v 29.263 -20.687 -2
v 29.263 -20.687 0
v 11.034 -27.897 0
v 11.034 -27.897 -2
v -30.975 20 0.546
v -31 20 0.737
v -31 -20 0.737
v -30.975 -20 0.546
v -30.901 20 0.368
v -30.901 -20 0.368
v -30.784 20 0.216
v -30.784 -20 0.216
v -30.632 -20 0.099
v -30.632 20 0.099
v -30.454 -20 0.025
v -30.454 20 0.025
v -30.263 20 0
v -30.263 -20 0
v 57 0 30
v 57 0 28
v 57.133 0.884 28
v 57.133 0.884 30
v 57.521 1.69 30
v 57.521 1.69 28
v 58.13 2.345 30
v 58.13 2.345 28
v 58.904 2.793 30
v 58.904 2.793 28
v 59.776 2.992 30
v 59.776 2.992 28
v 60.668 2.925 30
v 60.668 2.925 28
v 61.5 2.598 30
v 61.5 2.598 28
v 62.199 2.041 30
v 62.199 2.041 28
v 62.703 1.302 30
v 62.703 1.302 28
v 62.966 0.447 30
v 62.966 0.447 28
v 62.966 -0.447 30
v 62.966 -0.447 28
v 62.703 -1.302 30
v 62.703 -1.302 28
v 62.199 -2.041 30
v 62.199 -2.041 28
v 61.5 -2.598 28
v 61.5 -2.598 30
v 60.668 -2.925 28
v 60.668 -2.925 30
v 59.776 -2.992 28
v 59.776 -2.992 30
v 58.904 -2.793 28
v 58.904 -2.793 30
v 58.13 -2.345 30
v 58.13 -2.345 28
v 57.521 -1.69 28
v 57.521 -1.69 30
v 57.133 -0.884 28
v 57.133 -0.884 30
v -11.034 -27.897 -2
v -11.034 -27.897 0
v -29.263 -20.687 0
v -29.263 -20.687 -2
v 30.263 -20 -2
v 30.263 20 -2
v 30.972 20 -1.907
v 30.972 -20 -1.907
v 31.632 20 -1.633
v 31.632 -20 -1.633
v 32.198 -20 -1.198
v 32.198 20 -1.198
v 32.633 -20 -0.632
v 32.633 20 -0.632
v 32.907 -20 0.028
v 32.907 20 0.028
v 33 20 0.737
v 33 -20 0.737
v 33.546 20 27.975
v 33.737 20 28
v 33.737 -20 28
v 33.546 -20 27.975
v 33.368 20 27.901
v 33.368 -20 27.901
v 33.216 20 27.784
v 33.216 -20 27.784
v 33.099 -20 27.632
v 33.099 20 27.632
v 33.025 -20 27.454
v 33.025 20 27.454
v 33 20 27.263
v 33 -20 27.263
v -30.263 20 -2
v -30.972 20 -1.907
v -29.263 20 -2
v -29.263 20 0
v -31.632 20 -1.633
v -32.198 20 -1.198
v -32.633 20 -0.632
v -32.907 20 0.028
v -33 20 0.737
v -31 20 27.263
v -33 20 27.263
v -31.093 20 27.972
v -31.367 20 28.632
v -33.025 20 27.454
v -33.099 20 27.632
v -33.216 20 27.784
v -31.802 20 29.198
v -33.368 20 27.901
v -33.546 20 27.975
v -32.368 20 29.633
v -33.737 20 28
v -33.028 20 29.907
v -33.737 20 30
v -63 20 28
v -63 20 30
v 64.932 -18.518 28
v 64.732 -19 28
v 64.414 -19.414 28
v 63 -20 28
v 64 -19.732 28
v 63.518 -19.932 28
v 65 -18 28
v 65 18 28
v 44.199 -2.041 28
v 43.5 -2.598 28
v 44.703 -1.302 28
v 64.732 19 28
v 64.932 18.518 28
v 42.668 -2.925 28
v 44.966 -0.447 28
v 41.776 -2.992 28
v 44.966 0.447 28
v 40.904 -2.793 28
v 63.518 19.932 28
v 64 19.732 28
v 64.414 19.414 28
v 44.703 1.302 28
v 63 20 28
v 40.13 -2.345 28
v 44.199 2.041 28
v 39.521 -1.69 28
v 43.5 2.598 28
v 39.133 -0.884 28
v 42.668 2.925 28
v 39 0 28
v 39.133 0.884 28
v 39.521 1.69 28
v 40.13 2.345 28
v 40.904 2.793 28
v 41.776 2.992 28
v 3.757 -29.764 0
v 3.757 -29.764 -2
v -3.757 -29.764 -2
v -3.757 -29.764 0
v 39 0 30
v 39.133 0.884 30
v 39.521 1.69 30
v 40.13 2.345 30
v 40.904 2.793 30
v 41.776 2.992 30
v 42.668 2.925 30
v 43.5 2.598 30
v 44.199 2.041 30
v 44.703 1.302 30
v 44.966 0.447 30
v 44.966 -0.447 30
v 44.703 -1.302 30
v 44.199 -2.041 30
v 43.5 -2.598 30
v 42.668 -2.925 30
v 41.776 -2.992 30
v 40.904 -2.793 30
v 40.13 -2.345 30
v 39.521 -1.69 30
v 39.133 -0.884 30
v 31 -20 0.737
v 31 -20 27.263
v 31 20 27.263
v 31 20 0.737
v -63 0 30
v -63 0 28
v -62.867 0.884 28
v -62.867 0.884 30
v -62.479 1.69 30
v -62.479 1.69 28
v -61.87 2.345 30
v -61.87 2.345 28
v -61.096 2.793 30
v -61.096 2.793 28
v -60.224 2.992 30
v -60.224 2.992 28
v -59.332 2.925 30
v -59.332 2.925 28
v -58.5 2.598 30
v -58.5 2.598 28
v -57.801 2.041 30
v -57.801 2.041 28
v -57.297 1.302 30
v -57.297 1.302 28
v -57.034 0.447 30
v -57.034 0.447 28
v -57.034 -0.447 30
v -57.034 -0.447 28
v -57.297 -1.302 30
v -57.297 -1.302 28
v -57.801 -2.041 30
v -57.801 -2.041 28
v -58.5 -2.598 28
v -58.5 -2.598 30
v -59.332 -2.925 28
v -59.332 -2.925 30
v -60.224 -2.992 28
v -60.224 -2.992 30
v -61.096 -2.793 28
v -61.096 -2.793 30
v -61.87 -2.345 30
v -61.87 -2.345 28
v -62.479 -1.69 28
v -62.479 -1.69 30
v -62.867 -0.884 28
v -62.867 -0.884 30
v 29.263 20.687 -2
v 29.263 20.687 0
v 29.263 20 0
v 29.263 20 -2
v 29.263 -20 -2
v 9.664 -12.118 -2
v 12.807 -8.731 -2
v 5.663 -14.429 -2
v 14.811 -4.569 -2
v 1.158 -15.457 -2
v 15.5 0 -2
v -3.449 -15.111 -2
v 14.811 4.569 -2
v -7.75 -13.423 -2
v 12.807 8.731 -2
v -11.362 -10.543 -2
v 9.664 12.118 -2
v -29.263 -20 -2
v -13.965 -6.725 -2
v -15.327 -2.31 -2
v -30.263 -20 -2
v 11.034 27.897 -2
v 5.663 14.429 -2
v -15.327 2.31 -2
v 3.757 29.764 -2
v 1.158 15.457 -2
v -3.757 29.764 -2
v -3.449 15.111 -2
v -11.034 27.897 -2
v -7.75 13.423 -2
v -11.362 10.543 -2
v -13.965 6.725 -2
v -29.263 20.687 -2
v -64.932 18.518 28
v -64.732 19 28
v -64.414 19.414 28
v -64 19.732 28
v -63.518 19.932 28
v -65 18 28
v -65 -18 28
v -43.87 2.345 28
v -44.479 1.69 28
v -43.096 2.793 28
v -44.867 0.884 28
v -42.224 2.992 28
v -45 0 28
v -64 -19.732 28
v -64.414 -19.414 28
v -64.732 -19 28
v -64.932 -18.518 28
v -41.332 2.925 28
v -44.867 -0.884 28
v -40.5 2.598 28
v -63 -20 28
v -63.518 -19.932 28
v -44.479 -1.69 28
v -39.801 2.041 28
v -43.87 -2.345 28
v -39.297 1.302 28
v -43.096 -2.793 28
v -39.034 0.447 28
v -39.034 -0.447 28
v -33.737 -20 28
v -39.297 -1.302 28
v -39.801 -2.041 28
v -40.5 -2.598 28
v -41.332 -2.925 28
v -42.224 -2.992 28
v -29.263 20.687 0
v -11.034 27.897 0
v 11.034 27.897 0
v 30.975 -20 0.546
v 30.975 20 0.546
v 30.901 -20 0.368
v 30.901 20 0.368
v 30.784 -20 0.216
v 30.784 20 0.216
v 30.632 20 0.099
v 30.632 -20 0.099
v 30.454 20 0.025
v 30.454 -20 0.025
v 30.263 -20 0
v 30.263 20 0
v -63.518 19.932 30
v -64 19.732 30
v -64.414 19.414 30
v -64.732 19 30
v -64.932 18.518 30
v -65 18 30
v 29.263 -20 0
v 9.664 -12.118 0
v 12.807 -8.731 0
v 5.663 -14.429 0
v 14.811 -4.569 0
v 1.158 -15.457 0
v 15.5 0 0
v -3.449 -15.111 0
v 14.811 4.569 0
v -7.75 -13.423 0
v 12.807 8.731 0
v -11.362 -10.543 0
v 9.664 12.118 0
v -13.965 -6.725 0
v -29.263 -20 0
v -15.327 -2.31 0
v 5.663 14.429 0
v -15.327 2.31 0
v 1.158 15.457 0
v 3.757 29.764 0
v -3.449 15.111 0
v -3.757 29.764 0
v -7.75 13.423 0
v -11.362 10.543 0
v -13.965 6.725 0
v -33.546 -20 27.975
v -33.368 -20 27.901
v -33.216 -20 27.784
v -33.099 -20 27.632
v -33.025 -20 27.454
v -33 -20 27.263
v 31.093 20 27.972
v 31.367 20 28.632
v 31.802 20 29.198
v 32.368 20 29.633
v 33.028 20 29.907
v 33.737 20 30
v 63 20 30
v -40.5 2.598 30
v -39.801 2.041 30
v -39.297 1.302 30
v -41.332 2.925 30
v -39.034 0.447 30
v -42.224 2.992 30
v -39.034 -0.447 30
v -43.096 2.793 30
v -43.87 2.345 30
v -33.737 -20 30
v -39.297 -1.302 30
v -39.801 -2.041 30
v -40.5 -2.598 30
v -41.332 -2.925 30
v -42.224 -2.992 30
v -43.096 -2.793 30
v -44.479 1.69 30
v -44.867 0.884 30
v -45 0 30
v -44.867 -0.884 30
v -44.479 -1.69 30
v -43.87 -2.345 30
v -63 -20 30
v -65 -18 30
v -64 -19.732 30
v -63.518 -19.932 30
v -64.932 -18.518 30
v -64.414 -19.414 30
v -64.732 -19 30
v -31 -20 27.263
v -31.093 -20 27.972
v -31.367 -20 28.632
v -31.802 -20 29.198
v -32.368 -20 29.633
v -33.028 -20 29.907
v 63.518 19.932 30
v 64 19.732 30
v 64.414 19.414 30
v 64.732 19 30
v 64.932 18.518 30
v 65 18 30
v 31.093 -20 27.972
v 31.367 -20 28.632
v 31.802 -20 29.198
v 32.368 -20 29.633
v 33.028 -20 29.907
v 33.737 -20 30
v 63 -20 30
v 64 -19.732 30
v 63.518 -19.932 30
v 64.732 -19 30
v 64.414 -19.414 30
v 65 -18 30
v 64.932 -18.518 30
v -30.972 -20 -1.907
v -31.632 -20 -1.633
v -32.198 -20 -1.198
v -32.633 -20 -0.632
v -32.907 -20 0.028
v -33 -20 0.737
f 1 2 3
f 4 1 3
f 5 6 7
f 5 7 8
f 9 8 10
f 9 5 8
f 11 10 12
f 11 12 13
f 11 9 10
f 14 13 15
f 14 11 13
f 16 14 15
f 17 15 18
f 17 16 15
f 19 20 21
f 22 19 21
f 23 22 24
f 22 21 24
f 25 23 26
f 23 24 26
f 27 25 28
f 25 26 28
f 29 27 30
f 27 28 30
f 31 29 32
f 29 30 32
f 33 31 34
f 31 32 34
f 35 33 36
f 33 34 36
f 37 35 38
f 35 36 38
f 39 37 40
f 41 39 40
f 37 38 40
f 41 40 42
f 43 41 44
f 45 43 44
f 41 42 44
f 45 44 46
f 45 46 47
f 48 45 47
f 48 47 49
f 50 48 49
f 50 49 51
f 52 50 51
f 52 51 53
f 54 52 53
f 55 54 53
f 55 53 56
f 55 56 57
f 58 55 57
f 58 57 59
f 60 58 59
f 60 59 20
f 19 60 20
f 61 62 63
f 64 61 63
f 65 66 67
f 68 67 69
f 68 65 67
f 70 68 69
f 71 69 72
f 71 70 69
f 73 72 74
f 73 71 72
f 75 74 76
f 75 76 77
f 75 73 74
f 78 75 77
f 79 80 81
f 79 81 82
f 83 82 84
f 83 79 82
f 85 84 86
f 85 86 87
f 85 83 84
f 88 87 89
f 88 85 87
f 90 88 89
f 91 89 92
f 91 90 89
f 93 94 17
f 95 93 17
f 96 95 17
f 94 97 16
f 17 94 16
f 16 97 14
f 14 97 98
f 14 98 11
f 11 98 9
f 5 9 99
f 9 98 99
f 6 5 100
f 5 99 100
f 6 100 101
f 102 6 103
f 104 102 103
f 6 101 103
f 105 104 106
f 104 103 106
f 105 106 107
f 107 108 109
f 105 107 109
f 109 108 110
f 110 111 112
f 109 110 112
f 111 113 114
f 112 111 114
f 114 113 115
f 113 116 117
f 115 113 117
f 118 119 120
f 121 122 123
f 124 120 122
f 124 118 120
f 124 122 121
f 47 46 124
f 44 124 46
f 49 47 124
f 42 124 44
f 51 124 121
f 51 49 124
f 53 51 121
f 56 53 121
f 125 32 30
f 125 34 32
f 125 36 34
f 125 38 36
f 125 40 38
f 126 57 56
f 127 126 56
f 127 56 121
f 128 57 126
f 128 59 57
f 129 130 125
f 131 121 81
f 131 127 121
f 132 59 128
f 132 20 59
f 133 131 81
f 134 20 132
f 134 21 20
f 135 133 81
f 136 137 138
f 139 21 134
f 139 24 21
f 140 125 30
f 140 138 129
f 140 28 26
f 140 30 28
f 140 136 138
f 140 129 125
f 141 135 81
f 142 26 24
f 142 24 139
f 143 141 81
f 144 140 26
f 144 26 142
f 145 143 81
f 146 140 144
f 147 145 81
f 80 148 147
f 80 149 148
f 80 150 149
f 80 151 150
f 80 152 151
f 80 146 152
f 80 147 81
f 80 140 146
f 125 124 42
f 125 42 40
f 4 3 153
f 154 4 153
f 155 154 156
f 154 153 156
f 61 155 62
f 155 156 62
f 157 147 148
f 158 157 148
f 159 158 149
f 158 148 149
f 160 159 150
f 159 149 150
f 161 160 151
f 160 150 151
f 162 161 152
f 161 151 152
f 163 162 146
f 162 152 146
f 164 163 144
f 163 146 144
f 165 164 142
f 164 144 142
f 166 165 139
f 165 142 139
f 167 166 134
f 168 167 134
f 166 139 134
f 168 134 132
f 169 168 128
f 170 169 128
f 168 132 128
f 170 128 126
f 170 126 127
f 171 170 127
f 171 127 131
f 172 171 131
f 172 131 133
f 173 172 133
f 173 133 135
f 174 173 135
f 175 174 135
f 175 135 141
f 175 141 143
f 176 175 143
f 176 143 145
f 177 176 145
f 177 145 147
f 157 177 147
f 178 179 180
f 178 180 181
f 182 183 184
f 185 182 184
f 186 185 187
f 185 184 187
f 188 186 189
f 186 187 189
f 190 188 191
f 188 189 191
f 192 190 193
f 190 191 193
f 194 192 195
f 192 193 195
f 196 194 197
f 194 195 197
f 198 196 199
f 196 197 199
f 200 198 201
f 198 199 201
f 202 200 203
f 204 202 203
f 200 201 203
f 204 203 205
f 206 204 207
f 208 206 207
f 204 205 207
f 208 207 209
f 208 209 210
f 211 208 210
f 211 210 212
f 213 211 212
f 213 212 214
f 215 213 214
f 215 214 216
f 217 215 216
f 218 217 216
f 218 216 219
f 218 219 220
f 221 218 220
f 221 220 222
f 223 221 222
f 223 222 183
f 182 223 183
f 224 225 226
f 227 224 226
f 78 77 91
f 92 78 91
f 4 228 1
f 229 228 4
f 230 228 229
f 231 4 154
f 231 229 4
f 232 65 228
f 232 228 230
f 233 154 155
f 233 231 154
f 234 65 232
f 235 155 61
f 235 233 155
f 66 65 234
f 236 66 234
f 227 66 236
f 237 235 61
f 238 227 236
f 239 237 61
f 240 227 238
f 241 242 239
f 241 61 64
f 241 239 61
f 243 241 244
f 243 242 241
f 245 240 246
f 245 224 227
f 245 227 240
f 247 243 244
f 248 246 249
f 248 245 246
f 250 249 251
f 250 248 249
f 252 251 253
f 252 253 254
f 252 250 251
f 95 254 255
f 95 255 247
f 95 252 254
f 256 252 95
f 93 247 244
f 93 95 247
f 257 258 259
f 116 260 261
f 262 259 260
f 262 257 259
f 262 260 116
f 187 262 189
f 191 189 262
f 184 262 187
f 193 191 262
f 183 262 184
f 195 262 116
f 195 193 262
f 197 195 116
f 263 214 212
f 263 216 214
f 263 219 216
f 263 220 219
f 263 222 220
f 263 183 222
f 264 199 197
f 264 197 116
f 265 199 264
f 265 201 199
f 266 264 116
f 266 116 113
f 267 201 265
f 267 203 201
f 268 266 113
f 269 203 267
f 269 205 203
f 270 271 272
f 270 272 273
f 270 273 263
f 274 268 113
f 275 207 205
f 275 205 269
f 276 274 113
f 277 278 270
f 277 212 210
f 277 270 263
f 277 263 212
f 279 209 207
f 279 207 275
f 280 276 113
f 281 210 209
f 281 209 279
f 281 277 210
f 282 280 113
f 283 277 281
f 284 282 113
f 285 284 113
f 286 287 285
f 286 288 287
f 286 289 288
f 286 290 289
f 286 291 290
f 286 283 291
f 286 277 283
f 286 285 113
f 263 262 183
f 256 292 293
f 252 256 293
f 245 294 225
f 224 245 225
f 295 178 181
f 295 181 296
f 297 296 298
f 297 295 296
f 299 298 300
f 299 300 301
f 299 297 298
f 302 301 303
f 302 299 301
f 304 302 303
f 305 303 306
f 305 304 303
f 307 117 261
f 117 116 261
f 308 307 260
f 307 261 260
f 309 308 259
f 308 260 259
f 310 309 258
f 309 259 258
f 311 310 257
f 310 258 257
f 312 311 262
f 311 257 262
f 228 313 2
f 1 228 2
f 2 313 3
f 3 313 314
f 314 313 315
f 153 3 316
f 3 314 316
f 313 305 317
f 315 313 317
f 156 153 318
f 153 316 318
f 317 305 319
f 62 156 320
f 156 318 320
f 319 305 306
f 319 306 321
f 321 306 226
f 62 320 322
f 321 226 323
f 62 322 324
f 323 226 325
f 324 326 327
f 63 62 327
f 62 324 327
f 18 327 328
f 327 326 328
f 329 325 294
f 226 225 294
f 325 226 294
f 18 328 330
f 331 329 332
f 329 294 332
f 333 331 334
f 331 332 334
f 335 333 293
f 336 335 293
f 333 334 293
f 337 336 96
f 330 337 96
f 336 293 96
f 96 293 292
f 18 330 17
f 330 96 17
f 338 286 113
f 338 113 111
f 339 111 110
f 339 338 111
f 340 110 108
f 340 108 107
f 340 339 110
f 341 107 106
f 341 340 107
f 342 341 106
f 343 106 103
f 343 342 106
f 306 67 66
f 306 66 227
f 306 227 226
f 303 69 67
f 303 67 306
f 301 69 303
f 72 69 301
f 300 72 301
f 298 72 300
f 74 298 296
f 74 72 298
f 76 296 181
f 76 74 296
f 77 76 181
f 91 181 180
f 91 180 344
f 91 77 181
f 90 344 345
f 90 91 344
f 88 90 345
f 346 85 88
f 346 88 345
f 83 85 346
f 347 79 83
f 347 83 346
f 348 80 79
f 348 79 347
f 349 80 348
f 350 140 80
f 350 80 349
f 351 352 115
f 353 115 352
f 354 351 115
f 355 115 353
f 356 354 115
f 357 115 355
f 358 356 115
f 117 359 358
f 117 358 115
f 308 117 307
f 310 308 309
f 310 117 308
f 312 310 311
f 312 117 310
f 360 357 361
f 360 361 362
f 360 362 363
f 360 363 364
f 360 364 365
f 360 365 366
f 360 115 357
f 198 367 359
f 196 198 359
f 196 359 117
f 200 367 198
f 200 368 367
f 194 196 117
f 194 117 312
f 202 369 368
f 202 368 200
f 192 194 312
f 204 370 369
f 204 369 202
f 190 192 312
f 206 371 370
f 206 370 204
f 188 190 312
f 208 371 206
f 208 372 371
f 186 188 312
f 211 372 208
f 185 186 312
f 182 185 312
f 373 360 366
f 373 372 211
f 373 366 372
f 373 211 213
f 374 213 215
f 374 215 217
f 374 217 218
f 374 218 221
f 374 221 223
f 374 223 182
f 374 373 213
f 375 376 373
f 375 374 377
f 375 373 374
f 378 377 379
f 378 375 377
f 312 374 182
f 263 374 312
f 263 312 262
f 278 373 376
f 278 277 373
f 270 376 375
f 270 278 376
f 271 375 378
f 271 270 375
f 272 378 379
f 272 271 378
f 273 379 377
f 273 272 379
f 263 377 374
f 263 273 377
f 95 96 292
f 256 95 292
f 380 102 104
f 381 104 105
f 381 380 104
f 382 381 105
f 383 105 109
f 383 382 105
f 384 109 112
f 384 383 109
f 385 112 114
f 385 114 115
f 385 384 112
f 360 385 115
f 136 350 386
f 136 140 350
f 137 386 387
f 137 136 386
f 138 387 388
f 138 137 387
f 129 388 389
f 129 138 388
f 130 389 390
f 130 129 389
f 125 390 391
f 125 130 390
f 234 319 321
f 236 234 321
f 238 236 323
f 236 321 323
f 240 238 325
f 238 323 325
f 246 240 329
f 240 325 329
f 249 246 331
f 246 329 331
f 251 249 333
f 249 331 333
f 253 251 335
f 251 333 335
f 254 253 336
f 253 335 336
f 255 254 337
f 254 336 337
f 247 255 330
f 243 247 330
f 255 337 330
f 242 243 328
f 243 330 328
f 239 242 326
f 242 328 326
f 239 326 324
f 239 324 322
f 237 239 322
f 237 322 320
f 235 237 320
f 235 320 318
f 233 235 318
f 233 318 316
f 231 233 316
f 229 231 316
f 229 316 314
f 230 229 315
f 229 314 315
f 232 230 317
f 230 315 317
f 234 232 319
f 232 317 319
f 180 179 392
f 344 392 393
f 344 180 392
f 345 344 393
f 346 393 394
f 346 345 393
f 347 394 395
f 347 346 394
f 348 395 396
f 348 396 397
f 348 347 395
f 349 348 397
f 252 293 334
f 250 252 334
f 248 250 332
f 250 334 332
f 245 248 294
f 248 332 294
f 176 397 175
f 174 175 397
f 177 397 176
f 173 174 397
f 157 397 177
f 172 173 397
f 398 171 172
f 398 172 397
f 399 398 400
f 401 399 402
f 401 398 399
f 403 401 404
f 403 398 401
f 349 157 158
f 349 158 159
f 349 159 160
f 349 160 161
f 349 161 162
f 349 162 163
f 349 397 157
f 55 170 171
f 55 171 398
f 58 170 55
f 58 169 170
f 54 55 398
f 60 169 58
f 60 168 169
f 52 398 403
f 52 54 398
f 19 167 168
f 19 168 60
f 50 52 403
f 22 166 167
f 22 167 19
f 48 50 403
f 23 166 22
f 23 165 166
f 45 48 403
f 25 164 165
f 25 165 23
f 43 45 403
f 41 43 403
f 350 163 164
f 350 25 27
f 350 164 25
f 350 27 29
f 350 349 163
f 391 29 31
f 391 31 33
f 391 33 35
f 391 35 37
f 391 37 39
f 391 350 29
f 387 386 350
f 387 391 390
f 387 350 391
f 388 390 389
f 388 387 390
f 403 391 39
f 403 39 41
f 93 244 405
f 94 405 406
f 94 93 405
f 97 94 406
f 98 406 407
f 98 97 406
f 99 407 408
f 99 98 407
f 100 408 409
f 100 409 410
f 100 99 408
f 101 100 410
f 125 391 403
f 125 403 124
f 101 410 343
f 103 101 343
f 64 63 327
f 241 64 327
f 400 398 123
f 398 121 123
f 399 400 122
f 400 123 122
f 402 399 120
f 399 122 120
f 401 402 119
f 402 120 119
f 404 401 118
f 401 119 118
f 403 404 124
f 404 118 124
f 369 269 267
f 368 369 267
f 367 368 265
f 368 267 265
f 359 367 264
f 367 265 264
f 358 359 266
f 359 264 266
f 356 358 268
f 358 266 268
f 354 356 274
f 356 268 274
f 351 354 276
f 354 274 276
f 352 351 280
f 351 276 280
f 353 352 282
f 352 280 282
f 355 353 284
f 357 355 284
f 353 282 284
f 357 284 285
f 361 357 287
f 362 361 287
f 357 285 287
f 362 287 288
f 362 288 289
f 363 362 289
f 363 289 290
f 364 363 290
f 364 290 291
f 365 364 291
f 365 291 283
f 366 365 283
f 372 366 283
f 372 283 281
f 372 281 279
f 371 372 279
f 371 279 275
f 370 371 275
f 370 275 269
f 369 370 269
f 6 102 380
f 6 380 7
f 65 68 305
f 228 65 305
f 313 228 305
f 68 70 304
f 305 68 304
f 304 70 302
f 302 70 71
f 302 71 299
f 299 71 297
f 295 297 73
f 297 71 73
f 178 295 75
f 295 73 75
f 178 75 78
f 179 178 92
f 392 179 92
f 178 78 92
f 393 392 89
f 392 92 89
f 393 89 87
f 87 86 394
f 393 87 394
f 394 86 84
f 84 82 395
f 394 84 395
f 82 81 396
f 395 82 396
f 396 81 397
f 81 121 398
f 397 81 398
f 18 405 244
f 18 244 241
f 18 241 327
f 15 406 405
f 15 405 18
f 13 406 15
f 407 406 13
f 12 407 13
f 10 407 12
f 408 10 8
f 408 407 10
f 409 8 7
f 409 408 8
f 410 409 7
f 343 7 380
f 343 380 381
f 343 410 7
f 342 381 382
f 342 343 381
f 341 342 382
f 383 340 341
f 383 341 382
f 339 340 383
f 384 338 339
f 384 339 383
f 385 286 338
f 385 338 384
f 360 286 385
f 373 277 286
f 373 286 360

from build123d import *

# Parameters (mm, degrees)
SKETCH1_R                       = 15.5
BASE_FLANGE1_DEPTH              = 2
EDGE_FLANGE1_STRIP_W            = 9.4732
EDGE_FLANGE1_STRIP_H            = 2
EDGE_FLANGE1_STRIP_CUT_DEPTH    = 40
EDGE_FLANGE1_RELIEF_W           = 10.4732
EDGE_FLANGE1_RELIEF_H           = 1
EDGE_FLANGE1_RELIEF_CUT_DEPTH   = 2
EDGE_FLANGE1_STRIP_2_W          = 9.4732
EDGE_FLANGE1_STRIP_2_H          = 2
EDGE_FLANGE1_STRIP_CUT_2_DEPTH  = 40
EDGE_FLANGE1_RELIEF_2_W         = 10.4732
EDGE_FLANGE1_RELIEF_2_H         = 1
EDGE_FLANGE1_RELIEF_CUT_2_DEPTH = 2
EDGE_FLANGE1_DEPTH              = 40
EDGE_FLANGE1_BEND_DEPTH         = 40
EDGE_FLANGE2_STRIP_W            = 9.4732
EDGE_FLANGE2_STRIP_H            = 2
EDGE_FLANGE2_STRIP_CUT_DEPTH    = 40
EDGE_FLANGE2_STRIP_2_W          = 9.4732
EDGE_FLANGE2_STRIP_2_H          = 2
EDGE_FLANGE2_STRIP_CUT_2_DEPTH  = 40
EDGE_FLANGE2_DEPTH              = 40
EDGE_FLANGE2_BEND_DEPTH         = 40
SKETCH17_R                      = 3
CUT_EXTRUDE1_DEPTH              = 10
FILLET1_R                       = 2


# Sheet-metal steps are written as plain solids
with BuildPart() as part:
    # Sketch1 → Base-Flange1 (new body)
    with BuildSketch(Plane.XY):
        with BuildLine():
            Line((-31, 20), (-11.034132012, 27.897095382))
            ThreePointArc((-11.034132012, 27.897095382), (0, 30), (11.034132012, 27.897095382))
            Line((11.034132012, 27.897095382), (31, 20))
            Line((31, 20), (31, -20))
            Line((31, -20), (11.034132012, -27.897095382))
            ThreePointArc((11.034132012, -27.897095382), (0, -30), (-11.034132012, -27.897095382))
            Line((-11.034132012, -27.897095382), (-31, -20))
            Line((-31, -20), (-31, 20))
        make_face()
        Circle(SKETCH1_R, mode=Mode.SUBTRACT)
    extrude(amount=-BASE_FLANGE1_DEPTH)

    # Edge-Flange1 strip (across the edge) → Edge-Flange1 strip cut (cut)
    with BuildSketch(Plane(origin=(-31, 20, 0), x_dir=(1, 0, 0), z_dir=(0, -1, 0))):
        with Locations((-4, -1)):
            Rectangle(EDGE_FLANGE1_STRIP_W, EDGE_FLANGE1_STRIP_H)
    extrude(amount=EDGE_FLANGE1_STRIP_CUT_DEPTH, mode=Mode.SUBTRACT)

    # Edge-Flange1 relief (on the sheet) → Edge-Flange1 relief cut (cut)
    with BuildSketch(Plane(origin=(-30.2634, 20, 0), x_dir=(1, 0, 0), z_dir=(0, 0, 1))):
        with Locations((-4.2366, 0.5)):
            Rectangle(EDGE_FLANGE1_RELIEF_W, EDGE_FLANGE1_RELIEF_H)
        with Locations((-4.2366, -40.5)):
            Rectangle(EDGE_FLANGE1_RELIEF_W, EDGE_FLANGE1_RELIEF_H)
    extrude(amount=-EDGE_FLANGE1_RELIEF_CUT_DEPTH, mode=Mode.SUBTRACT)

    # Edge-Flange1 strip 2 (across the edge) → Edge-Flange1 strip cut 2 (cut)
    with BuildSketch(Plane(origin=(31, -20, 0), x_dir=(-1, 0, 0), z_dir=(0, 1, 0))):
        with Locations((-4, -1)):
            Rectangle(EDGE_FLANGE1_STRIP_2_W, EDGE_FLANGE1_STRIP_2_H)
    extrude(amount=EDGE_FLANGE1_STRIP_CUT_2_DEPTH, mode=Mode.SUBTRACT)

    # Edge-Flange1 relief 2 (on the sheet) → Edge-Flange1 relief cut 2 (cut)
    with BuildSketch(Plane(origin=(30.2634, -20, 0), x_dir=(-1, 0, 0), z_dir=(0, 0, 1))):
        with Locations((-4.2366, 0.5)):
            Rectangle(EDGE_FLANGE1_RELIEF_2_W, EDGE_FLANGE1_RELIEF_2_H)
        with Locations((-4.2366, -40.5)):
            Rectangle(EDGE_FLANGE1_RELIEF_2_W, EDGE_FLANGE1_RELIEF_2_H)
    extrude(amount=-EDGE_FLANGE1_RELIEF_CUT_2_DEPTH, mode=Mode.SUBTRACT)

    # Edge-Flange1 section (across the edge) → Edge-Flange1 (add)
    with BuildSketch(Plane(origin=(-31, 20, 0), x_dir=(1, 0, 0), z_dir=(0, -1, 0))):
        with BuildLine():
            Line((-2, 0.7366), (-2, 28))
            Line((-2, 28), (0, 28))
            Line((0, 28), (0, 0.7366))
            ThreePointArc((0, 0.7366), (0.215745145, 0.215745145), (0.7366, 0))
            Line((0.7366, 0), (0.7366, -2))
            ThreePointArc((0.7366, -2), (-1.198468417, -1.198468417), (-2, 0.7366))
        make_face()
    extrude(amount=EDGE_FLANGE1_DEPTH)

    # Edge-Flange1 section 2 (across the edge) → Edge-Flange1 bend (add)
    with BuildSketch(Plane(origin=(31, -20, 0), x_dir=(-1, 0, 0), z_dir=(0, 1, 0))):
        with BuildLine():
            Line((-2, 0.7366), (-2, 28))
            Line((-2, 28), (0, 28))
            Line((0, 28), (0, 0.7366))
            ThreePointArc((0, 0.7366), (0.215745145, 0.215745145), (0.7366, 0))
            Line((0.7366, 0), (0.7366, -2))
            ThreePointArc((0.7366, -2), (-1.198468417, -1.198468417), (-2, 0.7366))
        make_face()
    extrude(amount=EDGE_FLANGE1_BEND_DEPTH)

    # Edge-Flange2 strip (across the edge) → Edge-Flange2 strip cut (cut)
    with BuildSketch(Plane(origin=(-33, -20, 28), x_dir=(0, 0, -1), z_dir=(0, 1, 0))):
        with Locations((-4, -1)):
            Rectangle(EDGE_FLANGE2_STRIP_W, EDGE_FLANGE2_STRIP_H)
    extrude(amount=EDGE_FLANGE2_STRIP_CUT_DEPTH, mode=Mode.SUBTRACT)

    # Edge-Flange2 strip 2 (across the edge) → Edge-Flange2 strip cut 2 (cut)
    with BuildSketch(Plane(origin=(33, 20, 28), x_dir=(0, 0, -1), z_dir=(0, -1, 0))):
        with Locations((-4, -1)):
            Rectangle(EDGE_FLANGE2_STRIP_2_W, EDGE_FLANGE2_STRIP_2_H)
    extrude(amount=EDGE_FLANGE2_STRIP_CUT_2_DEPTH, mode=Mode.SUBTRACT)

    # Edge-Flange2 section (across the edge) → Edge-Flange2 (add)
    with BuildSketch(Plane(origin=(-33, -20, 28), x_dir=(0, 0, -1), z_dir=(0, 1, 0))):
        with BuildLine():
            Line((-2, 0.7366), (-2, 32))
            Line((-2, 32), (0, 32))
            Line((0, 32), (0, 0.7366))
            ThreePointArc((0, 0.7366), (0.215745145, 0.215745145), (0.7366, 0))
            Line((0.7366, 0), (0.7366, -2))
            ThreePointArc((0.7366, -2), (-1.198468417, -1.198468417), (-2, 0.7366))
        make_face()
    extrude(amount=EDGE_FLANGE2_DEPTH)

    # Edge-Flange2 section 2 (across the edge) → Edge-Flange2 bend (add)
    with BuildSketch(Plane(origin=(33, 20, 28), x_dir=(0, 0, -1), z_dir=(0, -1, 0))):
        with BuildLine():
            Line((-2, 0.7366), (-2, 32))
            Line((-2, 32), (0, 32))
            Line((0, 32), (0, 0.7366))
            ThreePointArc((0, 0.7366), (0.215745145, 0.215745145), (0.7366, 0))
            Line((0.7366, 0), (0.7366, -2))
            ThreePointArc((0.7366, -2), (-1.198468417, -1.198468417), (-2, 0.7366))
        make_face()
    extrude(amount=EDGE_FLANGE2_BEND_DEPTH)

    # Sketch17 → Cut-Extrude1 (cut)
    with BuildSketch(Plane(origin=(0, 0, 28), x_dir=(-1, 0, 0), z_dir=(0, 0, -1))):
        with Locations((60, 0)):
            Circle(SKETCH17_R)
        with Locations((42, 0)):
            Circle(SKETCH17_R)
        with Locations((-60, 0)):
            Circle(SKETCH17_R)
        with Locations((-42, 0)):
            Circle(SKETCH17_R)
    extrude(amount=-CUT_EXTRUDE1_DEPTH, mode=Mode.SUBTRACT)

    # Fillet1
    fillet1_edges = [part.edges().sort_by_distance(p)[0] for p in [
        (-65, -20, 29),
        (-65, 20, 29),
        (65, 20, 29),
        (65, -20, 29),
    ]]
    fillet(fillet1_edges, radius=FILLET1_R)


solid = part.part
